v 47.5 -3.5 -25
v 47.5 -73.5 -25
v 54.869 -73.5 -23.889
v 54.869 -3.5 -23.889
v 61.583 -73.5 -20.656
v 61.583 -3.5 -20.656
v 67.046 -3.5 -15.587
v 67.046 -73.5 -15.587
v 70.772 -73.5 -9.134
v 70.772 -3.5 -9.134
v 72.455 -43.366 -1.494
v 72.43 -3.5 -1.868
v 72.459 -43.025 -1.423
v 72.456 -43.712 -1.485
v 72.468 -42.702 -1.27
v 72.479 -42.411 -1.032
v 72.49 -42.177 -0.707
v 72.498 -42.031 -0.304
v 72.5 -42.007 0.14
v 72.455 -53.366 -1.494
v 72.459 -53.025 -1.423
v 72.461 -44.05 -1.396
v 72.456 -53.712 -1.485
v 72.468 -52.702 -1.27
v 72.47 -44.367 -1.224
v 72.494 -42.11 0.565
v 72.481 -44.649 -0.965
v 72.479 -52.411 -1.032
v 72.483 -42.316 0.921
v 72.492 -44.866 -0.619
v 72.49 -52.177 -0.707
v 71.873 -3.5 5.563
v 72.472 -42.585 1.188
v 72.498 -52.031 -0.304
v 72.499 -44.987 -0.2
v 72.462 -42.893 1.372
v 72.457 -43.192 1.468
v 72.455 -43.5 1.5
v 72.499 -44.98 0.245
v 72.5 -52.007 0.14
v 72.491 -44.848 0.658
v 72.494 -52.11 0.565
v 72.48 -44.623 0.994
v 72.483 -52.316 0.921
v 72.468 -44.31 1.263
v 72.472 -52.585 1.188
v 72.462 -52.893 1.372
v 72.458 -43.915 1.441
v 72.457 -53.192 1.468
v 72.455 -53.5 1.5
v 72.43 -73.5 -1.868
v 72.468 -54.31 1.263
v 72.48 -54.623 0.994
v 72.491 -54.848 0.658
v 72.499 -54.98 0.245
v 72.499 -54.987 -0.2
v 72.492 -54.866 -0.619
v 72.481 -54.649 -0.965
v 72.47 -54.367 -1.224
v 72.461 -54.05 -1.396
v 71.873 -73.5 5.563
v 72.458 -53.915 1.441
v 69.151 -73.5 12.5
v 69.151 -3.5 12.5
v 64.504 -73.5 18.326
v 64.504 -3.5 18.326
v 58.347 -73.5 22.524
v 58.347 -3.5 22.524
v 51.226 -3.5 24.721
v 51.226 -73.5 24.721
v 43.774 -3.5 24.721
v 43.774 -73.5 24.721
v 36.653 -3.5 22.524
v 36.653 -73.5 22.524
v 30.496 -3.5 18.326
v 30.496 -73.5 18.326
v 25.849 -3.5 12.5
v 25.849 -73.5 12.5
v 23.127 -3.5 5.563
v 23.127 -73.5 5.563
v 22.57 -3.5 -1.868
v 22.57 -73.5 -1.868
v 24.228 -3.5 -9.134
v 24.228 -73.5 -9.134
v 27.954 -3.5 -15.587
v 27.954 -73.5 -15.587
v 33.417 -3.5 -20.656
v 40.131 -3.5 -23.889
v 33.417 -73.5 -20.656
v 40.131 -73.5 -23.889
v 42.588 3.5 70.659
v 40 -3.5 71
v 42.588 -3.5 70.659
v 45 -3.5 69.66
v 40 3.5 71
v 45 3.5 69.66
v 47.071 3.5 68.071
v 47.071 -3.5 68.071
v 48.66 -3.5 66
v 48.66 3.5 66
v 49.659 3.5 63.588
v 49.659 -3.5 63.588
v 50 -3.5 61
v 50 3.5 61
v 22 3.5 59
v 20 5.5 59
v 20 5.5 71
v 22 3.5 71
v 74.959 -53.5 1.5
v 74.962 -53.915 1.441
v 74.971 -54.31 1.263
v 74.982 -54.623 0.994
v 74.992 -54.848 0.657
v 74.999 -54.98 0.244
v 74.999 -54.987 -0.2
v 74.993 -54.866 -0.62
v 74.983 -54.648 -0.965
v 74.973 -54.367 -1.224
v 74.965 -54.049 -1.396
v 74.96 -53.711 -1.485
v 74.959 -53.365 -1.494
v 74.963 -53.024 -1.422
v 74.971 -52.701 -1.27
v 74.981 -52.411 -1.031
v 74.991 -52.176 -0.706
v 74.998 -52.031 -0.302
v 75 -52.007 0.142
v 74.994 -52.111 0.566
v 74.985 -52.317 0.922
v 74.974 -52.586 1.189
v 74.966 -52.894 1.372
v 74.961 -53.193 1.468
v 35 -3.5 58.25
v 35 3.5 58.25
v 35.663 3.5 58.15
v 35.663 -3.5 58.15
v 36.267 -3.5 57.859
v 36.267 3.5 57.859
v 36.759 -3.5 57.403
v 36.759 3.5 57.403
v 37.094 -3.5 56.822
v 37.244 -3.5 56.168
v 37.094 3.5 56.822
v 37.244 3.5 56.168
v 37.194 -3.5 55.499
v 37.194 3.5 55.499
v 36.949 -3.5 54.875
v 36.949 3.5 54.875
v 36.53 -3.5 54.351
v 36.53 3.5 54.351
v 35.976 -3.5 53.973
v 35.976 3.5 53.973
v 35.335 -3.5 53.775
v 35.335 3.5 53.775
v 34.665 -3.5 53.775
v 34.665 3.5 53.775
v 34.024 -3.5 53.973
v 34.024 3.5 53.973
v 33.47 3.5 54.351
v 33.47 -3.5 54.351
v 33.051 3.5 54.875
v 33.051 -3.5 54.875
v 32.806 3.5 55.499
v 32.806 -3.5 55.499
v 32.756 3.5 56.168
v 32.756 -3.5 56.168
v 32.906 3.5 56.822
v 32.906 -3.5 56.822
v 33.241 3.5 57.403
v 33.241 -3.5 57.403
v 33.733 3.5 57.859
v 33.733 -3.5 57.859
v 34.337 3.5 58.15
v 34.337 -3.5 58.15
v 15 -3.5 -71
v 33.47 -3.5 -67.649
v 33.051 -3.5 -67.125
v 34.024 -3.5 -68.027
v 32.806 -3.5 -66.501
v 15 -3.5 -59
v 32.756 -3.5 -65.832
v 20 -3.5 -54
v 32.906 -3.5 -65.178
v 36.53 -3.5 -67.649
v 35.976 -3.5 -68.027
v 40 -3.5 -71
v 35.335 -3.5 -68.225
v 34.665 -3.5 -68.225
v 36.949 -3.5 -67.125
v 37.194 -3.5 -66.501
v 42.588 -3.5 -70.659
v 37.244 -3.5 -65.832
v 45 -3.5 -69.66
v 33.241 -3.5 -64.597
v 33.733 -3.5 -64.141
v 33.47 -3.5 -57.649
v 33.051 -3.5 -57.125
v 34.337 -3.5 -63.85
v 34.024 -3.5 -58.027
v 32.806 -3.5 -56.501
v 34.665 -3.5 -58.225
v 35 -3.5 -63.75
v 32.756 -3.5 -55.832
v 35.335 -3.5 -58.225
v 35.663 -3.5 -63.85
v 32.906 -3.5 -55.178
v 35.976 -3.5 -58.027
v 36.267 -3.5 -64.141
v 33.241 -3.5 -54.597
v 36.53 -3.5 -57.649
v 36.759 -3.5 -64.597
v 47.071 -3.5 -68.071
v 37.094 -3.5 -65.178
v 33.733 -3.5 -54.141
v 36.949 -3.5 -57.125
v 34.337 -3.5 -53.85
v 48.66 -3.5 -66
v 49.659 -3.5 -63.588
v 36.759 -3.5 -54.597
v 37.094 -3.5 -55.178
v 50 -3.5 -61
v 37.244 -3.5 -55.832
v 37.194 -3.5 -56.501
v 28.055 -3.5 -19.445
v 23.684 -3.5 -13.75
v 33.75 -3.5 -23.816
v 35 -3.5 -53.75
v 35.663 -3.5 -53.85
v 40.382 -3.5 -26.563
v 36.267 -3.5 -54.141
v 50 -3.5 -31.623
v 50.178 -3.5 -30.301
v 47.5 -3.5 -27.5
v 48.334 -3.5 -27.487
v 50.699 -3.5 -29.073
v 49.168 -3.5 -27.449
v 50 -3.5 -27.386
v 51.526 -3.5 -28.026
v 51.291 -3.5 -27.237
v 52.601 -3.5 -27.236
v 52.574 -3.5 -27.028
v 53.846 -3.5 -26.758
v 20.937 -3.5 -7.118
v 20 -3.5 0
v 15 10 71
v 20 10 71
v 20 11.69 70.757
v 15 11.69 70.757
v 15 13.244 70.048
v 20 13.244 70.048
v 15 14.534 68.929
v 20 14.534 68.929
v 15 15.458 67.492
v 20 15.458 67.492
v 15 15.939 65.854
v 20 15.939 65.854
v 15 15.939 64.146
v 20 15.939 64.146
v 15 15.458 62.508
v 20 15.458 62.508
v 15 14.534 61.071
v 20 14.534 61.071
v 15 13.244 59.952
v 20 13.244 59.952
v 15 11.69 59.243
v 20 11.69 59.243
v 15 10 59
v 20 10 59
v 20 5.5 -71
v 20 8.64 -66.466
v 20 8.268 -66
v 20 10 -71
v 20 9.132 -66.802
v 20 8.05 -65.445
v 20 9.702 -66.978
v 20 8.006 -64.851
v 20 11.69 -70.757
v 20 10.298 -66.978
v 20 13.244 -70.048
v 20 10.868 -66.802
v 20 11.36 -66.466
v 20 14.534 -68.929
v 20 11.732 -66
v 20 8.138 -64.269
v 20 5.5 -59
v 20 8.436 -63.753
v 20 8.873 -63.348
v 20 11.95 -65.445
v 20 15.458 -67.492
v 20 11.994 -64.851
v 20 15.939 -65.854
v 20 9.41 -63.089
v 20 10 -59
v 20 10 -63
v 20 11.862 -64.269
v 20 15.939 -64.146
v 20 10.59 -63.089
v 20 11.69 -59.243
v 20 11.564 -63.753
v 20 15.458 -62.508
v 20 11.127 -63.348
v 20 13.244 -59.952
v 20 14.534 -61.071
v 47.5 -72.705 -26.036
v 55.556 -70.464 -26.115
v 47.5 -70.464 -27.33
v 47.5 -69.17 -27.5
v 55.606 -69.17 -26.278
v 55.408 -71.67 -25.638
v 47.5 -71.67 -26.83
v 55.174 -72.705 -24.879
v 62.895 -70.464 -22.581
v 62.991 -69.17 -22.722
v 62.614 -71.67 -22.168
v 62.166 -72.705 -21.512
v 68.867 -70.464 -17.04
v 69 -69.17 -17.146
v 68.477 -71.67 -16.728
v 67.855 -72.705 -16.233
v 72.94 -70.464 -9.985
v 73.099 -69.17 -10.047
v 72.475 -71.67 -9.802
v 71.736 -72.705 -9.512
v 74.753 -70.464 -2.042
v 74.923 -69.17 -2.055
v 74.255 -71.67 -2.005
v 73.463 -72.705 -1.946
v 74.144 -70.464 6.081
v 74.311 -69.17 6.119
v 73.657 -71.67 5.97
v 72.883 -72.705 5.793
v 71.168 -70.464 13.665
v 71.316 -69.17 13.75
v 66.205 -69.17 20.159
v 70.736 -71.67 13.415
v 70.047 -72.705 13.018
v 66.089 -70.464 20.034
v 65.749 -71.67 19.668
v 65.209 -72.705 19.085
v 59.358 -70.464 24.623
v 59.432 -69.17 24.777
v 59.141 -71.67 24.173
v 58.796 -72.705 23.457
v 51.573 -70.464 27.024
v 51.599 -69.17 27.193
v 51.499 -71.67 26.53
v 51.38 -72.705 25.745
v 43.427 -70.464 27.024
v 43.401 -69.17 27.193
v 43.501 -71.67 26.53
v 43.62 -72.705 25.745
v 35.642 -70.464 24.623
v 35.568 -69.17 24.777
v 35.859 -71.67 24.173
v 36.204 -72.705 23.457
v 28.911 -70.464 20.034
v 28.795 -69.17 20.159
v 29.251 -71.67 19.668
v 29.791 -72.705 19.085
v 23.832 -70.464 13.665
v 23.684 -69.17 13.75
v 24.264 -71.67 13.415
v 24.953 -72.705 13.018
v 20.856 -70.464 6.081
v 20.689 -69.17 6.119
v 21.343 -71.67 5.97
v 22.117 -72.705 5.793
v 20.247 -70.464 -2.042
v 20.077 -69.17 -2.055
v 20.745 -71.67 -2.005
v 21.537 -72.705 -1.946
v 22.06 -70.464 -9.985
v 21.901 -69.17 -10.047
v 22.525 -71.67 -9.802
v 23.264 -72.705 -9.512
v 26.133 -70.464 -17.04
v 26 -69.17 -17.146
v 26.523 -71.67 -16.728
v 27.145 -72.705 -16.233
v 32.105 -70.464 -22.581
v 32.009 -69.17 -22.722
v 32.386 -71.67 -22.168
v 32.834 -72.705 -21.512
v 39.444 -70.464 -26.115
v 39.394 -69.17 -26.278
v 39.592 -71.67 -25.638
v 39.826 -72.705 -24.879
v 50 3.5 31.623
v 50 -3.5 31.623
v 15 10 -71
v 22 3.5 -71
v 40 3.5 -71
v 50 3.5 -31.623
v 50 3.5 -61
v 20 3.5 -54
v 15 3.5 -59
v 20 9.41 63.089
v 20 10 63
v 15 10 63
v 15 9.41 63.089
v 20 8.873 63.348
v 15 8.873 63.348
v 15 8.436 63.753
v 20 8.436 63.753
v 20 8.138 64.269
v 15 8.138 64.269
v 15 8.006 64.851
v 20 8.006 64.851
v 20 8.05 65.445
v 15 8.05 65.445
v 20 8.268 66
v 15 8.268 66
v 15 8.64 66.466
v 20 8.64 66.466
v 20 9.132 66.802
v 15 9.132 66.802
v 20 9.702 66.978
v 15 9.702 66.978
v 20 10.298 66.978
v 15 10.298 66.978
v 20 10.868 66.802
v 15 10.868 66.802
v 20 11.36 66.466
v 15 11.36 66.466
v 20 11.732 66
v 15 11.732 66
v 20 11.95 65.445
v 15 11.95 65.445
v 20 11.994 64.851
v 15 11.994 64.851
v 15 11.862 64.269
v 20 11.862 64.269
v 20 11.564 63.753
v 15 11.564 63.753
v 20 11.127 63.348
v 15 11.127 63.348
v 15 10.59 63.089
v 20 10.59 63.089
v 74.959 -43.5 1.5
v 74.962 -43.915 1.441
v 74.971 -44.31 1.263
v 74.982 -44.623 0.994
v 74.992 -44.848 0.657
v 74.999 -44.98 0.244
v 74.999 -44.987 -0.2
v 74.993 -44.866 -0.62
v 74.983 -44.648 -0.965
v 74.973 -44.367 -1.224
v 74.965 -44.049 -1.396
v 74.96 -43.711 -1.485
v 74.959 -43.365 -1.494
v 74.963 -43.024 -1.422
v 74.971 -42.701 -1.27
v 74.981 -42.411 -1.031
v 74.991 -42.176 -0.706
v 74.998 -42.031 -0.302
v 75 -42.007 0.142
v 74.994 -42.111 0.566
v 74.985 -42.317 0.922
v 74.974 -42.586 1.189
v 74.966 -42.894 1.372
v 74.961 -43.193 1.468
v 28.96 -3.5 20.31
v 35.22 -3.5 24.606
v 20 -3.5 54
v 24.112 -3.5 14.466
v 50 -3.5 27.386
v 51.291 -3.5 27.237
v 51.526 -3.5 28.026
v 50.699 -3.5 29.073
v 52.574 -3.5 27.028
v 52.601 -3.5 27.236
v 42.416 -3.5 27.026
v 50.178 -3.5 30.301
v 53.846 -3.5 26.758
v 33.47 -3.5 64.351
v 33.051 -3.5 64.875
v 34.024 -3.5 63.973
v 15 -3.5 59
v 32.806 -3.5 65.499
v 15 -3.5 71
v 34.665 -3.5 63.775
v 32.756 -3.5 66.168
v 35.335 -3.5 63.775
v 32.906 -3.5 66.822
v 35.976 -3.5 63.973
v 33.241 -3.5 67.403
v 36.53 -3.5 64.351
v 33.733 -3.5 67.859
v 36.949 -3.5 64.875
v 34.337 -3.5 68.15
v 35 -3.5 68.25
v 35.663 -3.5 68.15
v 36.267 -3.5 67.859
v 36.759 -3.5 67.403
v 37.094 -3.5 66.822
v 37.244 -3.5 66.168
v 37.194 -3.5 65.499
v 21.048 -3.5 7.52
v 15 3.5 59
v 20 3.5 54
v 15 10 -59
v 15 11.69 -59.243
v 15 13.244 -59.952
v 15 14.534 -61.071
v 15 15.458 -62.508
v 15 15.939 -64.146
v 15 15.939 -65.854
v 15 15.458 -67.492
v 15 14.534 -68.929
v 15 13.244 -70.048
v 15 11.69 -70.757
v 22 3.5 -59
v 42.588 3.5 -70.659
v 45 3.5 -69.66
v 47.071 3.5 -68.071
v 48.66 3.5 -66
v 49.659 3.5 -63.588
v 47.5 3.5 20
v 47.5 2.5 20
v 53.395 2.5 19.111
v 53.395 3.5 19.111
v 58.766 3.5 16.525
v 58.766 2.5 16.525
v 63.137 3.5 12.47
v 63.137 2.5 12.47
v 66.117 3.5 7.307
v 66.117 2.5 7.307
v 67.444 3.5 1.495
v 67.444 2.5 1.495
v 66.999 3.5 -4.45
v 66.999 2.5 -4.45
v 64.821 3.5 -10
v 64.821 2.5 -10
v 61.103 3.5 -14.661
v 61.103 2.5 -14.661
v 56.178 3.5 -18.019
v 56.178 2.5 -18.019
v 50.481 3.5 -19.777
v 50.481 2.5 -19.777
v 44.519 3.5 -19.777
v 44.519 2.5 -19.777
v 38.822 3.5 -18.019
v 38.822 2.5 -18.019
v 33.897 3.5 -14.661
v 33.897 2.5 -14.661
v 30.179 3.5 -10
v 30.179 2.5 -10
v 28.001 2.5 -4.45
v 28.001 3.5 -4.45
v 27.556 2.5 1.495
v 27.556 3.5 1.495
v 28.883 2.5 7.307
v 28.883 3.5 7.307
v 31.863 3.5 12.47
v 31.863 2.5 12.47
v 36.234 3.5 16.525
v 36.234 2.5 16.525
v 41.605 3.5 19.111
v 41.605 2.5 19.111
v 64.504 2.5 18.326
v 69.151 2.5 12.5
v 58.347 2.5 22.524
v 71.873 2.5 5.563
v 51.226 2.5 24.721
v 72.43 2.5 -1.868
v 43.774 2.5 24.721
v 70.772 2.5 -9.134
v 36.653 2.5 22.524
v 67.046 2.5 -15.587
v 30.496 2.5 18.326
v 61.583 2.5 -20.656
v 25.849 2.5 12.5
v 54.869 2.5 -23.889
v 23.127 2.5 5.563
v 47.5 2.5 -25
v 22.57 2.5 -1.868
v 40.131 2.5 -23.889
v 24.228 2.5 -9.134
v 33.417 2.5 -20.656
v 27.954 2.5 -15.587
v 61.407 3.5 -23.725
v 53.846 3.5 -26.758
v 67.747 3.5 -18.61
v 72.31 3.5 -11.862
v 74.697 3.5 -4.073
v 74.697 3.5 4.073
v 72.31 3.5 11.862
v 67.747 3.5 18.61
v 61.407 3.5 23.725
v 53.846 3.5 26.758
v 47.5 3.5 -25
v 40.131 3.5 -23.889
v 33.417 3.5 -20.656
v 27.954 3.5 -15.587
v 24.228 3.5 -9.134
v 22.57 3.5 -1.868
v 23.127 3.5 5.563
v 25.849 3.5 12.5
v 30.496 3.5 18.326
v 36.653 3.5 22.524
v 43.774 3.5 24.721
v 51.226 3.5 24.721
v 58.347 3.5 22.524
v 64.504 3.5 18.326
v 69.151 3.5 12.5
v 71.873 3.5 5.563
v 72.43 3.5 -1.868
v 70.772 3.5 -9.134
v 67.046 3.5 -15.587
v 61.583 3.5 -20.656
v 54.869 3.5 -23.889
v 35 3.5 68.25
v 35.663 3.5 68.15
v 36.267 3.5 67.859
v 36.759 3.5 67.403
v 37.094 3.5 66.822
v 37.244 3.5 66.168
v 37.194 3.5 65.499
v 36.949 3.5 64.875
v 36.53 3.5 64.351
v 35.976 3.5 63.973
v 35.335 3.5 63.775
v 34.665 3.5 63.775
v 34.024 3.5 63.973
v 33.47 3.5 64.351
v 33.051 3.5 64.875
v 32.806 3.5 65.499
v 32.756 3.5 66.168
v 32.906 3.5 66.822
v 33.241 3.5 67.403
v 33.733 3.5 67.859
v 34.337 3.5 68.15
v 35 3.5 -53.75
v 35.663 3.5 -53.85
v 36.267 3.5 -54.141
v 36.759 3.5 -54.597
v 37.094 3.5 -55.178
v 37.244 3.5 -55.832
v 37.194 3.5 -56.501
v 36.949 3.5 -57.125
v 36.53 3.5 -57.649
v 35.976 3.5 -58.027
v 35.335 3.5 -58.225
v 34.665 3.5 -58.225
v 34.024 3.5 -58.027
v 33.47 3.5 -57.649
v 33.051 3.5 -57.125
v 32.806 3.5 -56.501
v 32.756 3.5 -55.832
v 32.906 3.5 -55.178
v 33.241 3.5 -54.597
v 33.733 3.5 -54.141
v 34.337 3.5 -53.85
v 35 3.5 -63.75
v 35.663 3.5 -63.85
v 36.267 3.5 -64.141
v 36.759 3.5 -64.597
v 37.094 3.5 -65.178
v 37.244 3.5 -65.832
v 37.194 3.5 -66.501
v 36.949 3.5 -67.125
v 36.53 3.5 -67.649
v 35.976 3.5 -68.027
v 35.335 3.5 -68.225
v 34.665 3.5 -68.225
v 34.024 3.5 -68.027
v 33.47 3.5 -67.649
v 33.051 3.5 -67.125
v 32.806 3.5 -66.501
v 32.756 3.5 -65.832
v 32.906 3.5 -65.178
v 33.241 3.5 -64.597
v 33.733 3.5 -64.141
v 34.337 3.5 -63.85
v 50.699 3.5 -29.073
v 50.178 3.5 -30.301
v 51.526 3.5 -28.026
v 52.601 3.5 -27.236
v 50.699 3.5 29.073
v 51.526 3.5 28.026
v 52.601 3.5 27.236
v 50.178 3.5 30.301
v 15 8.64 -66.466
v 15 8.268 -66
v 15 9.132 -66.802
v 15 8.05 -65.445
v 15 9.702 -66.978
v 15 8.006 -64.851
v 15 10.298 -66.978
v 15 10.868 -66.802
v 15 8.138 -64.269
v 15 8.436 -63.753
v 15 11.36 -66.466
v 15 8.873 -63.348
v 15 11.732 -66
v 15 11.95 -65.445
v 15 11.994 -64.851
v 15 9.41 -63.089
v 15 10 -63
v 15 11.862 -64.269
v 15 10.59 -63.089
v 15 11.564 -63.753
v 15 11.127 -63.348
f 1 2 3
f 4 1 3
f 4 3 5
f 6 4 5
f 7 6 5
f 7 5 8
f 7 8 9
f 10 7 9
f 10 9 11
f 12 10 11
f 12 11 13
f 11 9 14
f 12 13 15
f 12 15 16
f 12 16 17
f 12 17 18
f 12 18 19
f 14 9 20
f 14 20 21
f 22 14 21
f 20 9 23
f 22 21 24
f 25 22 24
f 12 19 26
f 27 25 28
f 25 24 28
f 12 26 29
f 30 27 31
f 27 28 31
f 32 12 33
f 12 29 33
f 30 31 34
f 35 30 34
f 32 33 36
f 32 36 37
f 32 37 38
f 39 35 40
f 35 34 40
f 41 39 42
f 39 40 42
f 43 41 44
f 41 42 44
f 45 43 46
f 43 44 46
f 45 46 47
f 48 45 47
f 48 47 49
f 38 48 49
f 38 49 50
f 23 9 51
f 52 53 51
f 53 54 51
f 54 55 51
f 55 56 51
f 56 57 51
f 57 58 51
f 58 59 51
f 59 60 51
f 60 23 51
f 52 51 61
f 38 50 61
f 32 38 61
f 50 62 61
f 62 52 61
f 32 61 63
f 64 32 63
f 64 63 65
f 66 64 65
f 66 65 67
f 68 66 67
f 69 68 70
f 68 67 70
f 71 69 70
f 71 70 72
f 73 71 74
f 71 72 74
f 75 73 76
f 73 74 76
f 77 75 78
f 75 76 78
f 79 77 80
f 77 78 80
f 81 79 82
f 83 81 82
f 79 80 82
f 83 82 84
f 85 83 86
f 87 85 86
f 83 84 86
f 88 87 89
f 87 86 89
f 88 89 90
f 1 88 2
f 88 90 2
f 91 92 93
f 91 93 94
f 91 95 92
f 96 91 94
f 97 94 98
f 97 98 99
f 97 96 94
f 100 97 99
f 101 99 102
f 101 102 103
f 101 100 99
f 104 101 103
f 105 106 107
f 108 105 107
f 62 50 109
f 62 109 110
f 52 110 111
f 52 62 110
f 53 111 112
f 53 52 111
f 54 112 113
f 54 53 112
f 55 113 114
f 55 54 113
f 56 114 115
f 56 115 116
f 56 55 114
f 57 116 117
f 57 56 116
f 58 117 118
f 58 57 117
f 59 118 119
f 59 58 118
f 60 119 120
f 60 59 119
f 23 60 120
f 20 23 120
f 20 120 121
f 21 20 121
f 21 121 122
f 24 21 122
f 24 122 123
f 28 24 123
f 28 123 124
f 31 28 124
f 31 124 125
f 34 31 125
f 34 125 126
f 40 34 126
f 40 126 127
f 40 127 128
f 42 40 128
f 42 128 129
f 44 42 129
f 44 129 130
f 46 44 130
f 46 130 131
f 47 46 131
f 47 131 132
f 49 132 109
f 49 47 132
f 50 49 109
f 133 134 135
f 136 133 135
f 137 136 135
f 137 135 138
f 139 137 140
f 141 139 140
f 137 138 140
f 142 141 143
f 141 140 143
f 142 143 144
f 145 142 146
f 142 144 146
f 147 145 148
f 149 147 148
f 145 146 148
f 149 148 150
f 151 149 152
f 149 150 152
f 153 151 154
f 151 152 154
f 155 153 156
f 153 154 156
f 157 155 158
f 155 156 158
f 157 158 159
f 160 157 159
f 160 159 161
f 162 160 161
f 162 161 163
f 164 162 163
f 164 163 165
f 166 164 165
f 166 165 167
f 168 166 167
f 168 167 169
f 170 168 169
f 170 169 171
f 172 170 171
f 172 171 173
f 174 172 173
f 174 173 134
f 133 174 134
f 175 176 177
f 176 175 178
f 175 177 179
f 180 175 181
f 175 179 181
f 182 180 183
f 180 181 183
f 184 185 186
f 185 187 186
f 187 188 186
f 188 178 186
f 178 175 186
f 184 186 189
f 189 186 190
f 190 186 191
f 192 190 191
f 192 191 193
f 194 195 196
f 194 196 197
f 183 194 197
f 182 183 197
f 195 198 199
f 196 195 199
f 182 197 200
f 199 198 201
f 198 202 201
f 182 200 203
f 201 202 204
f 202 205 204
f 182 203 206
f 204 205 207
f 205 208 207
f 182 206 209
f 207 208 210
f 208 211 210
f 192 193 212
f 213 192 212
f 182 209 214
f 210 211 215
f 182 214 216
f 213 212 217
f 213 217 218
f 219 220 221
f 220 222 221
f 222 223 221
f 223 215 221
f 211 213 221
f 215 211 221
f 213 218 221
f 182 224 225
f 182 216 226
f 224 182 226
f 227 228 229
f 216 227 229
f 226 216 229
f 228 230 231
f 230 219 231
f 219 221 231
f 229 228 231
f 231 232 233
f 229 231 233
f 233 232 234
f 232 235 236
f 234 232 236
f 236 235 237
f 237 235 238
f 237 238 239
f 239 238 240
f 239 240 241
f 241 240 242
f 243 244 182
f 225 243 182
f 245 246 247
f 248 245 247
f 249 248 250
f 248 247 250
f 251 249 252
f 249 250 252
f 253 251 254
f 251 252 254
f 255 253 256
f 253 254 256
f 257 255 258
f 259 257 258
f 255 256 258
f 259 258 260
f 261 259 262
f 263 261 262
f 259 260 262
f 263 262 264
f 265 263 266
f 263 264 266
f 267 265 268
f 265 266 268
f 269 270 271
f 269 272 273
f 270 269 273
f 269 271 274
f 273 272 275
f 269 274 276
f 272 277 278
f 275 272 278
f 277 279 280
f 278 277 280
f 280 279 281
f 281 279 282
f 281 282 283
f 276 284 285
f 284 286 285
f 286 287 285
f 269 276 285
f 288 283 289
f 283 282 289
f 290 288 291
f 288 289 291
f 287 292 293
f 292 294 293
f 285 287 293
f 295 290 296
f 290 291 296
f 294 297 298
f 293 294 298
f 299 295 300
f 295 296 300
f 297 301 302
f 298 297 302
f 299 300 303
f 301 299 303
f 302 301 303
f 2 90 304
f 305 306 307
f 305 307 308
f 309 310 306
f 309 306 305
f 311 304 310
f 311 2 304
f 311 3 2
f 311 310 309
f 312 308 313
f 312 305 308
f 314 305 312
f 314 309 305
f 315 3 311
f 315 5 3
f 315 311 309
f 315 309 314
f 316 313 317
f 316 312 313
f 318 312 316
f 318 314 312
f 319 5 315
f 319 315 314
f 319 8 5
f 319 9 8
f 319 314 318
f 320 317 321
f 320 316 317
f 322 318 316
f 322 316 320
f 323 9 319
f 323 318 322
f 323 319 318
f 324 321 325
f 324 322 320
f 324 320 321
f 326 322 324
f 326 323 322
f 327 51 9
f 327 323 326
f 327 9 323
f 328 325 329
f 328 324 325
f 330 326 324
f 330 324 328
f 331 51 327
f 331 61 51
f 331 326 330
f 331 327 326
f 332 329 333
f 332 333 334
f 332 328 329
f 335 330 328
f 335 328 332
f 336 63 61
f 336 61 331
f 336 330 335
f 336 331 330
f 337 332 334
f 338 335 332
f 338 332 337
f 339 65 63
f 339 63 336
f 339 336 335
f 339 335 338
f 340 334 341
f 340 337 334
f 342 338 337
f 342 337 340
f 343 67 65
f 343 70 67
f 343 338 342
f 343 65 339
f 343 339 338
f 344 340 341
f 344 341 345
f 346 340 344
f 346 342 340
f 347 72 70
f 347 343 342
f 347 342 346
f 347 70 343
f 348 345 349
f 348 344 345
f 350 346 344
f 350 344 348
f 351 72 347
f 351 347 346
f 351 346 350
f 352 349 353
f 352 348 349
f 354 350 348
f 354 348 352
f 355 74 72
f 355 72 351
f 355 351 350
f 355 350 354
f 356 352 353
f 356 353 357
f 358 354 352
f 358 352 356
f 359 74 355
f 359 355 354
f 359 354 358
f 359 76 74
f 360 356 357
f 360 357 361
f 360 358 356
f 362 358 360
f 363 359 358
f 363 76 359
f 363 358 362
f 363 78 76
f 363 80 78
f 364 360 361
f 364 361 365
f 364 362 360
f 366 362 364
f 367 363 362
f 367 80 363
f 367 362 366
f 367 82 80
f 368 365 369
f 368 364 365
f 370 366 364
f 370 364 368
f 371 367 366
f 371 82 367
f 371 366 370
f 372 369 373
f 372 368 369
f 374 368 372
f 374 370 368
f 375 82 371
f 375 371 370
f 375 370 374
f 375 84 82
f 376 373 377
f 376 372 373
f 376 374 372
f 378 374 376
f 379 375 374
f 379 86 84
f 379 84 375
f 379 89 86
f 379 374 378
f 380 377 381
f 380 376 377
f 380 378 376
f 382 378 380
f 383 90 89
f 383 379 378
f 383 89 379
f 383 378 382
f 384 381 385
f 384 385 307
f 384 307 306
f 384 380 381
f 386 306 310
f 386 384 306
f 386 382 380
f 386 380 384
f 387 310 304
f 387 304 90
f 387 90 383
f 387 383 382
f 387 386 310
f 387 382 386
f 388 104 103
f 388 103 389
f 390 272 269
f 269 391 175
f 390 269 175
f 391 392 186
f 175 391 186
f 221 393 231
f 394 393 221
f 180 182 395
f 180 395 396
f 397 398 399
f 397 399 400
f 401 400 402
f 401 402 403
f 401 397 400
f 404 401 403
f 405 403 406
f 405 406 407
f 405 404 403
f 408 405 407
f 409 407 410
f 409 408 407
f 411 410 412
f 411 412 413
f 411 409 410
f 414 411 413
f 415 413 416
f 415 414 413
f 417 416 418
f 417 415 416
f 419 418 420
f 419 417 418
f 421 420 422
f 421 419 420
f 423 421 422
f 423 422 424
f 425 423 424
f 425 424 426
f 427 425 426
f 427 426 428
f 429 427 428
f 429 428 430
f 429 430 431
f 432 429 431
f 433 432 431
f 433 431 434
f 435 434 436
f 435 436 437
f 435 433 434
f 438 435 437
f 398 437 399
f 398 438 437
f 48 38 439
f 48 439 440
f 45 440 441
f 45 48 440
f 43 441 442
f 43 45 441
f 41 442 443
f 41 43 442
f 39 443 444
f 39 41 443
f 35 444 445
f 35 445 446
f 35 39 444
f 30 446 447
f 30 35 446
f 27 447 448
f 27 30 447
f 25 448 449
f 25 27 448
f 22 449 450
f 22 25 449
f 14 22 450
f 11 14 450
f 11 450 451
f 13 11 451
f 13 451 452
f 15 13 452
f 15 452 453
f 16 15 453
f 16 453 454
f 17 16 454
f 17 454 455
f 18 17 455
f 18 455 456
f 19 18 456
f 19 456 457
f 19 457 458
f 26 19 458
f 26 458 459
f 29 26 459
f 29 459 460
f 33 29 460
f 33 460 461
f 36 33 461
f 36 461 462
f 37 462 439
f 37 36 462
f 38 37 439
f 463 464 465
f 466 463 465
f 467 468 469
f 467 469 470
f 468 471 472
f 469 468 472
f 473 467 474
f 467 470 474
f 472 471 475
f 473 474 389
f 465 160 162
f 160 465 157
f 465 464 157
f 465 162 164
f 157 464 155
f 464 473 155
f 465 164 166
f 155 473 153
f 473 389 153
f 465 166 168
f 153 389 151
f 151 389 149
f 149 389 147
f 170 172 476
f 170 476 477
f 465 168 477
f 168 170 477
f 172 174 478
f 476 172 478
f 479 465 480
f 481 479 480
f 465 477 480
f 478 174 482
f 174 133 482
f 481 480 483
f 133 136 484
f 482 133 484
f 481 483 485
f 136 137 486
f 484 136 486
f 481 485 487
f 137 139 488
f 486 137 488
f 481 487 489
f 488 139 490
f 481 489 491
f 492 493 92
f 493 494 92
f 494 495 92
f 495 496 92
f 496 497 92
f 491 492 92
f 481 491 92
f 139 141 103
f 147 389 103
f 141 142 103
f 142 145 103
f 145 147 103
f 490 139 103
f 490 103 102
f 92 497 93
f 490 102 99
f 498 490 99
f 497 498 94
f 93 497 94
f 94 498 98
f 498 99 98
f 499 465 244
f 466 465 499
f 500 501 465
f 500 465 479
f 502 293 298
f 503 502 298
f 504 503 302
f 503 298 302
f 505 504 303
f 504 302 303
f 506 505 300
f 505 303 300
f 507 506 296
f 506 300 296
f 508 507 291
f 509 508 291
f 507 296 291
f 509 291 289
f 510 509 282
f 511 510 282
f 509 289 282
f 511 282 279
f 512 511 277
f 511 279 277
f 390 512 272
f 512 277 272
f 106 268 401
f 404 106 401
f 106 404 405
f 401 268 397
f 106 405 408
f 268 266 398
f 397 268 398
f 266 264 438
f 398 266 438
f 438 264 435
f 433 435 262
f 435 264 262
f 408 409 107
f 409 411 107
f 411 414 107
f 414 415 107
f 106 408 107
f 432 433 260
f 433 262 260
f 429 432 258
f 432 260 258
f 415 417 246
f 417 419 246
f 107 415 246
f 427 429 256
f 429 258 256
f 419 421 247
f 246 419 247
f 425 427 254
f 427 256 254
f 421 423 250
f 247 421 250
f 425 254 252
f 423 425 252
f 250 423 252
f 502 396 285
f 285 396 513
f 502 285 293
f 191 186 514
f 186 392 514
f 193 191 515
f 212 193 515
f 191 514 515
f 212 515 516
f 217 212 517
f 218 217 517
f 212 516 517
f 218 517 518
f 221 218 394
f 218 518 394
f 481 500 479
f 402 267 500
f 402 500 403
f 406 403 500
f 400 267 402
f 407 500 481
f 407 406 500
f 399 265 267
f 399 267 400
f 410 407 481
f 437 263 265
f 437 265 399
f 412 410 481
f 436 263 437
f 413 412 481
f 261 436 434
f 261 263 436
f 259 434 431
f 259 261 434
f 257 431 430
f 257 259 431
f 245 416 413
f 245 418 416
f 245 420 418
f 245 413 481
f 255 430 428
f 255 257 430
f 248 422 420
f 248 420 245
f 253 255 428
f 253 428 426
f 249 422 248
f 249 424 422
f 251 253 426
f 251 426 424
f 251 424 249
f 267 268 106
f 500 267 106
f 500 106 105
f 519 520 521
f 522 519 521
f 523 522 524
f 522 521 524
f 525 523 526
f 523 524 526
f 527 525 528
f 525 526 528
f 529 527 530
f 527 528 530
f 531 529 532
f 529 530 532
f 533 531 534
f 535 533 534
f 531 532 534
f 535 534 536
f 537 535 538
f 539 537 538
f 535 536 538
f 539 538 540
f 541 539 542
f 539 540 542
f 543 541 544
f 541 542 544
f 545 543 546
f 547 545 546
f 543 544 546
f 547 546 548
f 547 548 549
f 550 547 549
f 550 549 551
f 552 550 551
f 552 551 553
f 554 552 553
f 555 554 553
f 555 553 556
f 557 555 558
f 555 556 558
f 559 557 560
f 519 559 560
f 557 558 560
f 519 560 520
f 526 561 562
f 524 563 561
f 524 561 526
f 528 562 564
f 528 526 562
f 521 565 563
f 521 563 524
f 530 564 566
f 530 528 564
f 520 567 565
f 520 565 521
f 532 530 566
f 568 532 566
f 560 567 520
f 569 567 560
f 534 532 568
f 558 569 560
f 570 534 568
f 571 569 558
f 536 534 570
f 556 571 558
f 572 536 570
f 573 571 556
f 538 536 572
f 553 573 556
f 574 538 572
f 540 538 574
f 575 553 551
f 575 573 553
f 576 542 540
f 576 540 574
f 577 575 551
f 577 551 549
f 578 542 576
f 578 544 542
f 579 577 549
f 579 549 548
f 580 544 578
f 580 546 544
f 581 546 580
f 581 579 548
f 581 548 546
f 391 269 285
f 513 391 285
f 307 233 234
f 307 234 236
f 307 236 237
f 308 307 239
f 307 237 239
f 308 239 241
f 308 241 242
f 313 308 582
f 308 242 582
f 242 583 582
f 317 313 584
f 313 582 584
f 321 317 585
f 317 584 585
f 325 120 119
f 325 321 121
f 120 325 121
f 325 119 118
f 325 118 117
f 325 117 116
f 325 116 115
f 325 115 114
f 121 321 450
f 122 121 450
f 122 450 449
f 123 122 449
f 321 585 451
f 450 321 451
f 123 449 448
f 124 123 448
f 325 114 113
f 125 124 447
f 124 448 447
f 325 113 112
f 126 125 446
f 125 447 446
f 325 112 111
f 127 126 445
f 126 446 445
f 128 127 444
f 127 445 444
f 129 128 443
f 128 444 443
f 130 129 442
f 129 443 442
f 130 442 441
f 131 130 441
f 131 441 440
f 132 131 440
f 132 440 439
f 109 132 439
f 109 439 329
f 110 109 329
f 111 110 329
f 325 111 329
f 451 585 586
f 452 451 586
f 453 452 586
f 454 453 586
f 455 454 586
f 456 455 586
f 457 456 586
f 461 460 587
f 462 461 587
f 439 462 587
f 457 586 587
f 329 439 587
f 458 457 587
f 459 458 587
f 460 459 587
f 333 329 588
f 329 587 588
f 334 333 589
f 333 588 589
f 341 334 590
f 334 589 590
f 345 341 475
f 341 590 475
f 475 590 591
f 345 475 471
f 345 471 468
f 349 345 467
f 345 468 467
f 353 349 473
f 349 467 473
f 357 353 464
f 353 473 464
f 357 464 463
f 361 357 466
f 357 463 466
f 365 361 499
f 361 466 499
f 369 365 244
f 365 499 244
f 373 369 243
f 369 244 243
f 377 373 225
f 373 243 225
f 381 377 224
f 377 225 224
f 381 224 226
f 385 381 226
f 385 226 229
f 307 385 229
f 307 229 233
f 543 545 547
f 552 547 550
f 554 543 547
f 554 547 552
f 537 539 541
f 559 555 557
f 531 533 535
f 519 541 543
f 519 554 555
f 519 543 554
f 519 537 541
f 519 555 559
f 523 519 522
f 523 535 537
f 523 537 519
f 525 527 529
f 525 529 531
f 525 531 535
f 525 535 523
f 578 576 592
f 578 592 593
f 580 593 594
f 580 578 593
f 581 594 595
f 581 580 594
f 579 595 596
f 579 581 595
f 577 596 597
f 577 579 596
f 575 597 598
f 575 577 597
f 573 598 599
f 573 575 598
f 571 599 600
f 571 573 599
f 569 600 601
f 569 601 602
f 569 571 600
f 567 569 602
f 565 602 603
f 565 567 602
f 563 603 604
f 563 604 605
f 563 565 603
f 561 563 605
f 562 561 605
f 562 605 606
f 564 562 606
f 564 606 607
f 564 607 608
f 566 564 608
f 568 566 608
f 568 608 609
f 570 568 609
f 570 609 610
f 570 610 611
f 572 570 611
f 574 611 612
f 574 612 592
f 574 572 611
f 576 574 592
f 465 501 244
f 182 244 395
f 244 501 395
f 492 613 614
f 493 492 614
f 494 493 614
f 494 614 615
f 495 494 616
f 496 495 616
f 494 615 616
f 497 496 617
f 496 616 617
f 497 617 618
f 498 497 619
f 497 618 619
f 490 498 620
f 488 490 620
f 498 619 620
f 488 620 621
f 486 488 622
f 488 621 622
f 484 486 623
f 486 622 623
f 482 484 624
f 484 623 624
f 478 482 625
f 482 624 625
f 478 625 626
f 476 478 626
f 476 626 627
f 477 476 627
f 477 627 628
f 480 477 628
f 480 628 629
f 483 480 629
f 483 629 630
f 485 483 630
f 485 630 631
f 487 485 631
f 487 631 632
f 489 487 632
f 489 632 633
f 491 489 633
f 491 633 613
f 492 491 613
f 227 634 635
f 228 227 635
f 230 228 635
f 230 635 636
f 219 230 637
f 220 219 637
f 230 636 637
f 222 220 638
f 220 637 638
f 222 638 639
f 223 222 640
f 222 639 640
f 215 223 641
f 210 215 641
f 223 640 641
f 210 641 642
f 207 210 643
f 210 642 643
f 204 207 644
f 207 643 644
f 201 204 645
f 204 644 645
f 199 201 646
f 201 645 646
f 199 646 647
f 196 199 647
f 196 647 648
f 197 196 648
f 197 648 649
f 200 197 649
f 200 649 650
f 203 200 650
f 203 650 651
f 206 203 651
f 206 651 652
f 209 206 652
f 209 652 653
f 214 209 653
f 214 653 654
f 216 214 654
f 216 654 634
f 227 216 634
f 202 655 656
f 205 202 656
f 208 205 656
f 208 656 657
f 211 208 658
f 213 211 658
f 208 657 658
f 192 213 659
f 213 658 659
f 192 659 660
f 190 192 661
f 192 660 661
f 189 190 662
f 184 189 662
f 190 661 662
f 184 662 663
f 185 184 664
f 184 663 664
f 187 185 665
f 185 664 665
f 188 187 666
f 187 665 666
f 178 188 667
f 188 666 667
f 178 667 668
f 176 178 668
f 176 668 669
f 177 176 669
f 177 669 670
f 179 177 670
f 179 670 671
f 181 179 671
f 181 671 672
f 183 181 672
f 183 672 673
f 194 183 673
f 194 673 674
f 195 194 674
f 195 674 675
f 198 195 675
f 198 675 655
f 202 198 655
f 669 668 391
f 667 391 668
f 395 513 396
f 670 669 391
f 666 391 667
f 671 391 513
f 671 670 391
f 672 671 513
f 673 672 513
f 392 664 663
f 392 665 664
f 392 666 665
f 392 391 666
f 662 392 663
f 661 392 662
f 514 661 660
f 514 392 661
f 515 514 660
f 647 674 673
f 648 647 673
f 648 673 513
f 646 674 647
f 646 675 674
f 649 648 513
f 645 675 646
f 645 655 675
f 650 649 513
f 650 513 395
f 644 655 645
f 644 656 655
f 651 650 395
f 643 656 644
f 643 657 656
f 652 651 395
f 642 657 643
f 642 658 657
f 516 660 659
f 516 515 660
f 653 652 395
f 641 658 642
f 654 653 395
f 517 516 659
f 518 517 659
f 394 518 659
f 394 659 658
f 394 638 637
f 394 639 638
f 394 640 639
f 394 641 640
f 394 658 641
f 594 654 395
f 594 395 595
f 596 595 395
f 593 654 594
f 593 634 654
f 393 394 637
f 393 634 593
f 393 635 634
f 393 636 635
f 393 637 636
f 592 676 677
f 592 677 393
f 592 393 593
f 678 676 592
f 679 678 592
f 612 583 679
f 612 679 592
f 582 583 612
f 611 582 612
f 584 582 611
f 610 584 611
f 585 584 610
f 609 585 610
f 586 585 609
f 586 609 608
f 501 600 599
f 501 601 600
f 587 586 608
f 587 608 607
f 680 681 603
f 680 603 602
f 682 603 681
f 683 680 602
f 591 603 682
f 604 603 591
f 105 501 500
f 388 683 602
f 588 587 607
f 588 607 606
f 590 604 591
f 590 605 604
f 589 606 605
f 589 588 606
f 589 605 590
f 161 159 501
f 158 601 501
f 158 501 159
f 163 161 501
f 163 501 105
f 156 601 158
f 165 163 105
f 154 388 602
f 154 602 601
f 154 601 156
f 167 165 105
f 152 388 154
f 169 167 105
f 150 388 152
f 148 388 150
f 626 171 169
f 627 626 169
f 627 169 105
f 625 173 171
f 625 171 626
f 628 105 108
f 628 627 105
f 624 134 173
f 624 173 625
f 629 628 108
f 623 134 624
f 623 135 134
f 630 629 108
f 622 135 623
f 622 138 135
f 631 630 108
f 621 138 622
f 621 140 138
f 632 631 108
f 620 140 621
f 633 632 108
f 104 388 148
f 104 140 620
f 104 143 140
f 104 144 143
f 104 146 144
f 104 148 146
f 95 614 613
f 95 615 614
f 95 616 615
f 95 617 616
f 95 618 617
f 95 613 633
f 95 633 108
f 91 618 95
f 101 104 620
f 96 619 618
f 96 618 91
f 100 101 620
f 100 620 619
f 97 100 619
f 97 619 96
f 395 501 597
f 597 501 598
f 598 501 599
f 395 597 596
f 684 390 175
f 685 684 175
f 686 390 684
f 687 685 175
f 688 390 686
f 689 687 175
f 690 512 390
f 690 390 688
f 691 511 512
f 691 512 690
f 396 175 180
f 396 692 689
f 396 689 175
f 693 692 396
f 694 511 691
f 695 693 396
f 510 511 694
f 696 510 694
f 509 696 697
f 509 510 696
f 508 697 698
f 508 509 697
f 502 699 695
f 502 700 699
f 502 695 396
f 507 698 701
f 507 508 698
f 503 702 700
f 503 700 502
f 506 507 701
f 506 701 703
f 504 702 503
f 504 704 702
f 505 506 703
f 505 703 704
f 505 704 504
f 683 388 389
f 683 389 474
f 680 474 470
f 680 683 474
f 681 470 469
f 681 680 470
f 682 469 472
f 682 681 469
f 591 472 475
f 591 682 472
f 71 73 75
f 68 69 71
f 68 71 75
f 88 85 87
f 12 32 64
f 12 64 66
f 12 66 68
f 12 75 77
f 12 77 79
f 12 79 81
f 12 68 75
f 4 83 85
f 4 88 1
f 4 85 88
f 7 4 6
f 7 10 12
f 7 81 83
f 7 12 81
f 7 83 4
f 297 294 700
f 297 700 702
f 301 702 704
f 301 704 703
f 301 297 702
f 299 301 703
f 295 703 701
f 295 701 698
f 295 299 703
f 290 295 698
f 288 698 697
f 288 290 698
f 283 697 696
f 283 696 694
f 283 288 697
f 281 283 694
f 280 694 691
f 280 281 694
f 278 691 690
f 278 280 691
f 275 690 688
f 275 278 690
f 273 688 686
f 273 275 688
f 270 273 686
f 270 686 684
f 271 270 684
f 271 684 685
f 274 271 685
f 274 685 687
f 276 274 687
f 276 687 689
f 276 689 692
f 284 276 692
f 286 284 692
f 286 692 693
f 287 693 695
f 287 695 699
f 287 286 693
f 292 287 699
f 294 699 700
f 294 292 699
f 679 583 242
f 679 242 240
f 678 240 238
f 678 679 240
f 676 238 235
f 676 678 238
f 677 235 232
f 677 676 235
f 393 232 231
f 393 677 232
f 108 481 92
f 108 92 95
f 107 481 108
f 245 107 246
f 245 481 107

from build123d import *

# Parameters (mm, degrees)
CROQUIS1_R                          = 3
SALIENTE_EXTRUIR1_DEPTH             = 20
SALIENTE_EXTRUIR1_2_DEPTH           = 20
CROQUIS2_W                          = 142
CROQUIS2_H                          = 7
SALIENTE_EXTRUIR2_DEPTH             = 30
CROQUIS3_R                          = 27.5
SALIENTE_EXTRUIR3_DEPTH             = 70
SALIENTE_EXTRUIR3_DIRECTION_2_REACH = 89.121
CROQUIS4_R                          = 25
CORTAR_EXTRUIR1_DEPTH               = 70
CROQUIS5_R                          = 1
CORTAR_EXTRUIR2_DEPTH               = 5
CROQUIS6_R                          = 2.25
CORTAR_EXTRUIR3_DEPTH               = 10
REDONDEO1_R                         = 10
CORTAR_EXTRUIR4_DEPTH               = 117.052789712
CROQUIS8_R                          = 2
SALIENTE_EXTRUIR4_DEPTH             = 5
REDONDEO3_R                         = 5
CHAFL_N2_SIZE                       = 5
CHAFL_N1_SIZE                       = 2
CROQUIS9_R                          = 1.5
CORTAR_EXTRUIR5_DEPTH               = 109.019674134
CORTAR_EXTRUIR6_START               = -1
CROQUIS10_R                         = 25
CROQUIS10_R_2                       = 20
CORTAR_EXTRUIR6_DEPTH               = 1


with BuildPart() as part:
    # Croquis1 → Saliente-Extruir1 (new body)
    with BuildSketch(Plane(origin=(0, 0, 0), x_dir=(0, 0, -1), z_dir=(1, 0, 0))):
        with Locations((-65, 0)):
            Circle(CROQUIS1_R)
    extrude(amount=SALIENTE_EXTRUIR1_DEPTH)



with BuildPart() as body_2:
    # Croquis1 → Saliente-Extruir1 2 (new body)
    with BuildSketch(Plane(origin=(0, 0, 0), x_dir=(0, 0, -1), z_dir=(1, 0, 0))):
        with Locations((65, 0)):
            Circle(CROQUIS1_R)
    extrude(amount=SALIENTE_EXTRUIR1_2_DEPTH)


with BuildPart() as part_1:
    add(part.part)

    add(body_2.part)  # Saliente-Extruir2 merges body 2
    # Croquis2 → Saliente-Extruir2 (add)
    with BuildSketch(Plane(origin=(20, 0, 0), x_dir=(0, 0, -1), z_dir=(1, 0, 0))):
        Rectangle(CROQUIS2_W, CROQUIS2_H)
    extrude(amount=SALIENTE_EXTRUIR2_DEPTH)

    # Croquis3 → Saliente-Extruir3 (add)
    with BuildSketch(Plane.XZ.offset(3.5)):
        with Locations(Location((47.5, 0, 0), (0, 0, 270))):
            Circle(CROQUIS3_R)
    extrude(amount=SALIENTE_EXTRUIR3_DEPTH)

    # Saliente-Extruir3 direction 2: up to this face of the body (flat: up to its plane)
    saliente_extruir3_direction_2_end = Plane(part_1.part.faces().sort_by_distance((35, 3.5, 0))[0])
    # Croquis3 → Saliente-Extruir3 direction 2 (add, up to the picked face)
    with BuildSketch(Plane.XZ.offset(3.5), mode=Mode.PRIVATE) as saliente_extruir3_direction_2_sk1:
        with Locations(Location((47.5, 0, 0), (0, 0, 270))):
            Circle(CROQUIS3_R)
    saliente_extruir3_direction_2_tool1 = split(extrude(saliente_extruir3_direction_2_sk1.sketch, amount=-SALIENTE_EXTRUIR3_DIRECTION_2_REACH, mode=Mode.PRIVATE), bisect_by=saliente_extruir3_direction_2_end, keep=Keep.BOTH, mode=Mode.PRIVATE)
    add(saliente_extruir3_direction_2_tool1.solids().sort_by(Axis((47.5, -3.5, 0), (0, 1, 0)))[0])

    # Croquis4 → Cortar-Extruir1 (cut)
    with BuildSketch(Plane.XZ.offset(73.5)):
        with Locations(Location((47.5, 0, 0), (0, 0, 270))):
            Circle(CROQUIS4_R)
    extrude(amount=-CORTAR_EXTRUIR1_DEPTH, mode=Mode.SUBTRACT)

    # Croquis5 → Cortar-Extruir2 (cut)
    with BuildSketch(Plane.ZY):
        with Locations((-65, 0)):
            Circle(CROQUIS5_R)
        with Locations((65, 0)):
            Circle(CROQUIS5_R)
    extrude(amount=-CORTAR_EXTRUIR2_DEPTH, mode=Mode.SUBTRACT)

    # Croquis6 → Cortar-Extruir3 (cut)
    with BuildSketch(Plane(origin=(0, 3.5, 0), x_dir=(1, 0, 0), z_dir=(0, 1, 0))):
        with Locations(Location((35, 66, 0), (0, 0, 270))):
            Circle(CROQUIS6_R)
        with Locations(Location((35, 56, 0), (0, 0, 270))):
            Circle(CROQUIS6_R)
        with Locations(Location((35, -66, 0), (0, 0, 270))):
            Circle(CROQUIS6_R)
        with Locations(Location((35, -56, 0), (0, 0, 270))):
            Circle(CROQUIS6_R)
    extrude(amount=-CORTAR_EXTRUIR3_DEPTH, mode=Mode.SUBTRACT)

    # Redondeo1
    redondeo1_edges = [part_1.edges().sort_by_distance(p)[0] for p in [
        (50, 0, 71),
        (50, 0, -71),
    ]]
    fillet(redondeo1_edges, radius=REDONDEO1_R)

    # Croquis7 → Cortar-Extruir4 (cut, through all)
    with BuildSketch(Plane.ZY.offset(-20)):
        Polygon((-71, -3.5), (0, -3.5), (71, -3.5), (71, 3.5), (-71, 3.5), align=None)
    extrude(amount=CORTAR_EXTRUIR4_DEPTH, mode=Mode.SUBTRACT)

    # Croquis8 → Saliente-Extruir4 (add)
    # profile 1 of 2: a face of its own
    with BuildSketch(Plane.ZY.offset(-20)):
        with BuildLine():
            Line((-71, 10), (-71, -3.5))
            Line((-71, -3.5), (-59, -3.5))
            Line((-59, -3.5), (-59, 10))
            ThreePointArc((-59, 10), (-65, 16), (-71, 10))
        make_face()
        with Locations((-65, 10)):
            Circle(CROQUIS8_R, mode=Mode.SUBTRACT)
    # profile 2 of 2: a face of its own
    with BuildSketch(Plane.ZY.offset(-20)):
        with BuildLine():
            Line((59, 10), (59, -3.5))
            Line((59, -3.5), (71, -3.5))
            Line((71, -3.5), (71, 10))
            ThreePointArc((71, 10), (65, 16), (59, 10))
        make_face()
        with Locations(Location((65, 10, 0), (0, 0, 180))):
            Circle(CROQUIS8_R, mode=Mode.SUBTRACT)
    extrude(amount=SALIENTE_EXTRUIR4_DEPTH)

    # Redondeo3
    # the kernel refuses this fillet: 5 mm, written as the material it adds along each edge
    with BuildSketch(Plane(origin=(50, 3.5, -27.386127875), x_dir=(0, 0, -1), z_dir=(0, -1, 0))) as redondeo3_piece_1:
        with BuildLine():
            CenterArc((4.236648726, 5), REDONDEO3_R, 193.342363797, 76.657636203)
            ThreePointArc((-0.628393828, 3.846153846), (-0.245979187, 1.934222499), (0, 0))
            Line((0, 0), (4.236648726, 0))
        make_face()
    extrude(amount=7)
    with BuildSketch(Plane(origin=(50, 3.5, 27.386127875), x_dir=(0.9869144977622896, 0, -0.16124445449877534), z_dir=(0, -1, 0))) as redondeo3_piece_2:
        with BuildLine():
            CenterArc((4.251436376, 4.987432323), REDONDEO3_R, 189.279136184, 76.657636203)
            Line((-0.683136113, 4.18121005), (0, 0))
            ThreePointArc((0, 0), (1.948575006, 0.069122226), (3.897150011, 0))
        make_face()
    extrude(amount=7)
    # the kernel refuses this fillet: 5 mm, written as the material it takes off along each edge
    with BuildSketch(Plane(origin=(47.5, -73.5, 0), x_dir=(0, 0, -1), z_dir=(-1, 0, 0))) as redondeo3_2_piece_1:
        with BuildLine():
            CenterArc((22.5, -4.330127019), REDONDEO3_R, 0, 60)
            Line((25, 0), (27.5, 0))
            Line((27.5, 0), (27.5, -4.330127019))
        make_face()
    revolve(axis=Axis((47.5, -73.5, 0), (0, -1, 0)), mode=Mode.SUBTRACT)

    # Chaflán2
    # the kernel refuses this chamfer: 5 mm, written as the material it adds along each edge
    with BuildSketch(Plane(origin=(20, 3.5, 59), x_dir=(0, 0, -1), z_dir=(0, -1, 0)), Plane(origin=(20, -3.5, -59), x_dir=(0, 0, 1), z_dir=(0, 1, 0))) as chafl_n2_piece_1:
        Polygon((CHAFL_N2_SIZE, 0), (0, -CHAFL_N2_SIZE), (0, 0), align=None)
    extrude(amount=7)

    # Chaflán1
    chafl_n1_edges = [part_1.edges().sort_by_distance(p)[0] for p in [
        (20, 3.5, 65),
        (20, 3.5, -65),
    ]]
    chamfer(chafl_n1_edges, length=CHAFL_N1_SIZE)

    # Croquis9 → Cortar-Extruir5 (cut, through all)
    with BuildSketch(Plane(origin=(50, 0, 0), x_dir=(0, 0, -1), z_dir=(1, 0, 0))):
        with Locations(Location((0, -53.5, 0), (0, 0, 180))):
            Circle(CROQUIS9_R)
        with Locations(Location((0, -43.5, 0), (0, 0, 180))):
            Circle(CROQUIS9_R)
    extrude(amount=CORTAR_EXTRUIR5_DEPTH, mode=Mode.SUBTRACT)

    # Croquis10 → Cortar-Extruir6 (cut)
    with BuildSketch(Plane(origin=(0, 3.5, 0), x_dir=(1, 0, 0), z_dir=(0, 1, 0)).offset(CORTAR_EXTRUIR6_START)):
        with Locations(Location((47.5, 0, 0), (0, 0, 90))):
            Circle(CROQUIS10_R)
        with Locations(Location((47.5, 0, 0), (0, 0, 270))):
            Circle(CROQUIS10_R_2, mode=Mode.SUBTRACT)
    extrude(amount=CORTAR_EXTRUIR6_DEPTH, mode=Mode.SUBTRACT)


solid = part_1.part
